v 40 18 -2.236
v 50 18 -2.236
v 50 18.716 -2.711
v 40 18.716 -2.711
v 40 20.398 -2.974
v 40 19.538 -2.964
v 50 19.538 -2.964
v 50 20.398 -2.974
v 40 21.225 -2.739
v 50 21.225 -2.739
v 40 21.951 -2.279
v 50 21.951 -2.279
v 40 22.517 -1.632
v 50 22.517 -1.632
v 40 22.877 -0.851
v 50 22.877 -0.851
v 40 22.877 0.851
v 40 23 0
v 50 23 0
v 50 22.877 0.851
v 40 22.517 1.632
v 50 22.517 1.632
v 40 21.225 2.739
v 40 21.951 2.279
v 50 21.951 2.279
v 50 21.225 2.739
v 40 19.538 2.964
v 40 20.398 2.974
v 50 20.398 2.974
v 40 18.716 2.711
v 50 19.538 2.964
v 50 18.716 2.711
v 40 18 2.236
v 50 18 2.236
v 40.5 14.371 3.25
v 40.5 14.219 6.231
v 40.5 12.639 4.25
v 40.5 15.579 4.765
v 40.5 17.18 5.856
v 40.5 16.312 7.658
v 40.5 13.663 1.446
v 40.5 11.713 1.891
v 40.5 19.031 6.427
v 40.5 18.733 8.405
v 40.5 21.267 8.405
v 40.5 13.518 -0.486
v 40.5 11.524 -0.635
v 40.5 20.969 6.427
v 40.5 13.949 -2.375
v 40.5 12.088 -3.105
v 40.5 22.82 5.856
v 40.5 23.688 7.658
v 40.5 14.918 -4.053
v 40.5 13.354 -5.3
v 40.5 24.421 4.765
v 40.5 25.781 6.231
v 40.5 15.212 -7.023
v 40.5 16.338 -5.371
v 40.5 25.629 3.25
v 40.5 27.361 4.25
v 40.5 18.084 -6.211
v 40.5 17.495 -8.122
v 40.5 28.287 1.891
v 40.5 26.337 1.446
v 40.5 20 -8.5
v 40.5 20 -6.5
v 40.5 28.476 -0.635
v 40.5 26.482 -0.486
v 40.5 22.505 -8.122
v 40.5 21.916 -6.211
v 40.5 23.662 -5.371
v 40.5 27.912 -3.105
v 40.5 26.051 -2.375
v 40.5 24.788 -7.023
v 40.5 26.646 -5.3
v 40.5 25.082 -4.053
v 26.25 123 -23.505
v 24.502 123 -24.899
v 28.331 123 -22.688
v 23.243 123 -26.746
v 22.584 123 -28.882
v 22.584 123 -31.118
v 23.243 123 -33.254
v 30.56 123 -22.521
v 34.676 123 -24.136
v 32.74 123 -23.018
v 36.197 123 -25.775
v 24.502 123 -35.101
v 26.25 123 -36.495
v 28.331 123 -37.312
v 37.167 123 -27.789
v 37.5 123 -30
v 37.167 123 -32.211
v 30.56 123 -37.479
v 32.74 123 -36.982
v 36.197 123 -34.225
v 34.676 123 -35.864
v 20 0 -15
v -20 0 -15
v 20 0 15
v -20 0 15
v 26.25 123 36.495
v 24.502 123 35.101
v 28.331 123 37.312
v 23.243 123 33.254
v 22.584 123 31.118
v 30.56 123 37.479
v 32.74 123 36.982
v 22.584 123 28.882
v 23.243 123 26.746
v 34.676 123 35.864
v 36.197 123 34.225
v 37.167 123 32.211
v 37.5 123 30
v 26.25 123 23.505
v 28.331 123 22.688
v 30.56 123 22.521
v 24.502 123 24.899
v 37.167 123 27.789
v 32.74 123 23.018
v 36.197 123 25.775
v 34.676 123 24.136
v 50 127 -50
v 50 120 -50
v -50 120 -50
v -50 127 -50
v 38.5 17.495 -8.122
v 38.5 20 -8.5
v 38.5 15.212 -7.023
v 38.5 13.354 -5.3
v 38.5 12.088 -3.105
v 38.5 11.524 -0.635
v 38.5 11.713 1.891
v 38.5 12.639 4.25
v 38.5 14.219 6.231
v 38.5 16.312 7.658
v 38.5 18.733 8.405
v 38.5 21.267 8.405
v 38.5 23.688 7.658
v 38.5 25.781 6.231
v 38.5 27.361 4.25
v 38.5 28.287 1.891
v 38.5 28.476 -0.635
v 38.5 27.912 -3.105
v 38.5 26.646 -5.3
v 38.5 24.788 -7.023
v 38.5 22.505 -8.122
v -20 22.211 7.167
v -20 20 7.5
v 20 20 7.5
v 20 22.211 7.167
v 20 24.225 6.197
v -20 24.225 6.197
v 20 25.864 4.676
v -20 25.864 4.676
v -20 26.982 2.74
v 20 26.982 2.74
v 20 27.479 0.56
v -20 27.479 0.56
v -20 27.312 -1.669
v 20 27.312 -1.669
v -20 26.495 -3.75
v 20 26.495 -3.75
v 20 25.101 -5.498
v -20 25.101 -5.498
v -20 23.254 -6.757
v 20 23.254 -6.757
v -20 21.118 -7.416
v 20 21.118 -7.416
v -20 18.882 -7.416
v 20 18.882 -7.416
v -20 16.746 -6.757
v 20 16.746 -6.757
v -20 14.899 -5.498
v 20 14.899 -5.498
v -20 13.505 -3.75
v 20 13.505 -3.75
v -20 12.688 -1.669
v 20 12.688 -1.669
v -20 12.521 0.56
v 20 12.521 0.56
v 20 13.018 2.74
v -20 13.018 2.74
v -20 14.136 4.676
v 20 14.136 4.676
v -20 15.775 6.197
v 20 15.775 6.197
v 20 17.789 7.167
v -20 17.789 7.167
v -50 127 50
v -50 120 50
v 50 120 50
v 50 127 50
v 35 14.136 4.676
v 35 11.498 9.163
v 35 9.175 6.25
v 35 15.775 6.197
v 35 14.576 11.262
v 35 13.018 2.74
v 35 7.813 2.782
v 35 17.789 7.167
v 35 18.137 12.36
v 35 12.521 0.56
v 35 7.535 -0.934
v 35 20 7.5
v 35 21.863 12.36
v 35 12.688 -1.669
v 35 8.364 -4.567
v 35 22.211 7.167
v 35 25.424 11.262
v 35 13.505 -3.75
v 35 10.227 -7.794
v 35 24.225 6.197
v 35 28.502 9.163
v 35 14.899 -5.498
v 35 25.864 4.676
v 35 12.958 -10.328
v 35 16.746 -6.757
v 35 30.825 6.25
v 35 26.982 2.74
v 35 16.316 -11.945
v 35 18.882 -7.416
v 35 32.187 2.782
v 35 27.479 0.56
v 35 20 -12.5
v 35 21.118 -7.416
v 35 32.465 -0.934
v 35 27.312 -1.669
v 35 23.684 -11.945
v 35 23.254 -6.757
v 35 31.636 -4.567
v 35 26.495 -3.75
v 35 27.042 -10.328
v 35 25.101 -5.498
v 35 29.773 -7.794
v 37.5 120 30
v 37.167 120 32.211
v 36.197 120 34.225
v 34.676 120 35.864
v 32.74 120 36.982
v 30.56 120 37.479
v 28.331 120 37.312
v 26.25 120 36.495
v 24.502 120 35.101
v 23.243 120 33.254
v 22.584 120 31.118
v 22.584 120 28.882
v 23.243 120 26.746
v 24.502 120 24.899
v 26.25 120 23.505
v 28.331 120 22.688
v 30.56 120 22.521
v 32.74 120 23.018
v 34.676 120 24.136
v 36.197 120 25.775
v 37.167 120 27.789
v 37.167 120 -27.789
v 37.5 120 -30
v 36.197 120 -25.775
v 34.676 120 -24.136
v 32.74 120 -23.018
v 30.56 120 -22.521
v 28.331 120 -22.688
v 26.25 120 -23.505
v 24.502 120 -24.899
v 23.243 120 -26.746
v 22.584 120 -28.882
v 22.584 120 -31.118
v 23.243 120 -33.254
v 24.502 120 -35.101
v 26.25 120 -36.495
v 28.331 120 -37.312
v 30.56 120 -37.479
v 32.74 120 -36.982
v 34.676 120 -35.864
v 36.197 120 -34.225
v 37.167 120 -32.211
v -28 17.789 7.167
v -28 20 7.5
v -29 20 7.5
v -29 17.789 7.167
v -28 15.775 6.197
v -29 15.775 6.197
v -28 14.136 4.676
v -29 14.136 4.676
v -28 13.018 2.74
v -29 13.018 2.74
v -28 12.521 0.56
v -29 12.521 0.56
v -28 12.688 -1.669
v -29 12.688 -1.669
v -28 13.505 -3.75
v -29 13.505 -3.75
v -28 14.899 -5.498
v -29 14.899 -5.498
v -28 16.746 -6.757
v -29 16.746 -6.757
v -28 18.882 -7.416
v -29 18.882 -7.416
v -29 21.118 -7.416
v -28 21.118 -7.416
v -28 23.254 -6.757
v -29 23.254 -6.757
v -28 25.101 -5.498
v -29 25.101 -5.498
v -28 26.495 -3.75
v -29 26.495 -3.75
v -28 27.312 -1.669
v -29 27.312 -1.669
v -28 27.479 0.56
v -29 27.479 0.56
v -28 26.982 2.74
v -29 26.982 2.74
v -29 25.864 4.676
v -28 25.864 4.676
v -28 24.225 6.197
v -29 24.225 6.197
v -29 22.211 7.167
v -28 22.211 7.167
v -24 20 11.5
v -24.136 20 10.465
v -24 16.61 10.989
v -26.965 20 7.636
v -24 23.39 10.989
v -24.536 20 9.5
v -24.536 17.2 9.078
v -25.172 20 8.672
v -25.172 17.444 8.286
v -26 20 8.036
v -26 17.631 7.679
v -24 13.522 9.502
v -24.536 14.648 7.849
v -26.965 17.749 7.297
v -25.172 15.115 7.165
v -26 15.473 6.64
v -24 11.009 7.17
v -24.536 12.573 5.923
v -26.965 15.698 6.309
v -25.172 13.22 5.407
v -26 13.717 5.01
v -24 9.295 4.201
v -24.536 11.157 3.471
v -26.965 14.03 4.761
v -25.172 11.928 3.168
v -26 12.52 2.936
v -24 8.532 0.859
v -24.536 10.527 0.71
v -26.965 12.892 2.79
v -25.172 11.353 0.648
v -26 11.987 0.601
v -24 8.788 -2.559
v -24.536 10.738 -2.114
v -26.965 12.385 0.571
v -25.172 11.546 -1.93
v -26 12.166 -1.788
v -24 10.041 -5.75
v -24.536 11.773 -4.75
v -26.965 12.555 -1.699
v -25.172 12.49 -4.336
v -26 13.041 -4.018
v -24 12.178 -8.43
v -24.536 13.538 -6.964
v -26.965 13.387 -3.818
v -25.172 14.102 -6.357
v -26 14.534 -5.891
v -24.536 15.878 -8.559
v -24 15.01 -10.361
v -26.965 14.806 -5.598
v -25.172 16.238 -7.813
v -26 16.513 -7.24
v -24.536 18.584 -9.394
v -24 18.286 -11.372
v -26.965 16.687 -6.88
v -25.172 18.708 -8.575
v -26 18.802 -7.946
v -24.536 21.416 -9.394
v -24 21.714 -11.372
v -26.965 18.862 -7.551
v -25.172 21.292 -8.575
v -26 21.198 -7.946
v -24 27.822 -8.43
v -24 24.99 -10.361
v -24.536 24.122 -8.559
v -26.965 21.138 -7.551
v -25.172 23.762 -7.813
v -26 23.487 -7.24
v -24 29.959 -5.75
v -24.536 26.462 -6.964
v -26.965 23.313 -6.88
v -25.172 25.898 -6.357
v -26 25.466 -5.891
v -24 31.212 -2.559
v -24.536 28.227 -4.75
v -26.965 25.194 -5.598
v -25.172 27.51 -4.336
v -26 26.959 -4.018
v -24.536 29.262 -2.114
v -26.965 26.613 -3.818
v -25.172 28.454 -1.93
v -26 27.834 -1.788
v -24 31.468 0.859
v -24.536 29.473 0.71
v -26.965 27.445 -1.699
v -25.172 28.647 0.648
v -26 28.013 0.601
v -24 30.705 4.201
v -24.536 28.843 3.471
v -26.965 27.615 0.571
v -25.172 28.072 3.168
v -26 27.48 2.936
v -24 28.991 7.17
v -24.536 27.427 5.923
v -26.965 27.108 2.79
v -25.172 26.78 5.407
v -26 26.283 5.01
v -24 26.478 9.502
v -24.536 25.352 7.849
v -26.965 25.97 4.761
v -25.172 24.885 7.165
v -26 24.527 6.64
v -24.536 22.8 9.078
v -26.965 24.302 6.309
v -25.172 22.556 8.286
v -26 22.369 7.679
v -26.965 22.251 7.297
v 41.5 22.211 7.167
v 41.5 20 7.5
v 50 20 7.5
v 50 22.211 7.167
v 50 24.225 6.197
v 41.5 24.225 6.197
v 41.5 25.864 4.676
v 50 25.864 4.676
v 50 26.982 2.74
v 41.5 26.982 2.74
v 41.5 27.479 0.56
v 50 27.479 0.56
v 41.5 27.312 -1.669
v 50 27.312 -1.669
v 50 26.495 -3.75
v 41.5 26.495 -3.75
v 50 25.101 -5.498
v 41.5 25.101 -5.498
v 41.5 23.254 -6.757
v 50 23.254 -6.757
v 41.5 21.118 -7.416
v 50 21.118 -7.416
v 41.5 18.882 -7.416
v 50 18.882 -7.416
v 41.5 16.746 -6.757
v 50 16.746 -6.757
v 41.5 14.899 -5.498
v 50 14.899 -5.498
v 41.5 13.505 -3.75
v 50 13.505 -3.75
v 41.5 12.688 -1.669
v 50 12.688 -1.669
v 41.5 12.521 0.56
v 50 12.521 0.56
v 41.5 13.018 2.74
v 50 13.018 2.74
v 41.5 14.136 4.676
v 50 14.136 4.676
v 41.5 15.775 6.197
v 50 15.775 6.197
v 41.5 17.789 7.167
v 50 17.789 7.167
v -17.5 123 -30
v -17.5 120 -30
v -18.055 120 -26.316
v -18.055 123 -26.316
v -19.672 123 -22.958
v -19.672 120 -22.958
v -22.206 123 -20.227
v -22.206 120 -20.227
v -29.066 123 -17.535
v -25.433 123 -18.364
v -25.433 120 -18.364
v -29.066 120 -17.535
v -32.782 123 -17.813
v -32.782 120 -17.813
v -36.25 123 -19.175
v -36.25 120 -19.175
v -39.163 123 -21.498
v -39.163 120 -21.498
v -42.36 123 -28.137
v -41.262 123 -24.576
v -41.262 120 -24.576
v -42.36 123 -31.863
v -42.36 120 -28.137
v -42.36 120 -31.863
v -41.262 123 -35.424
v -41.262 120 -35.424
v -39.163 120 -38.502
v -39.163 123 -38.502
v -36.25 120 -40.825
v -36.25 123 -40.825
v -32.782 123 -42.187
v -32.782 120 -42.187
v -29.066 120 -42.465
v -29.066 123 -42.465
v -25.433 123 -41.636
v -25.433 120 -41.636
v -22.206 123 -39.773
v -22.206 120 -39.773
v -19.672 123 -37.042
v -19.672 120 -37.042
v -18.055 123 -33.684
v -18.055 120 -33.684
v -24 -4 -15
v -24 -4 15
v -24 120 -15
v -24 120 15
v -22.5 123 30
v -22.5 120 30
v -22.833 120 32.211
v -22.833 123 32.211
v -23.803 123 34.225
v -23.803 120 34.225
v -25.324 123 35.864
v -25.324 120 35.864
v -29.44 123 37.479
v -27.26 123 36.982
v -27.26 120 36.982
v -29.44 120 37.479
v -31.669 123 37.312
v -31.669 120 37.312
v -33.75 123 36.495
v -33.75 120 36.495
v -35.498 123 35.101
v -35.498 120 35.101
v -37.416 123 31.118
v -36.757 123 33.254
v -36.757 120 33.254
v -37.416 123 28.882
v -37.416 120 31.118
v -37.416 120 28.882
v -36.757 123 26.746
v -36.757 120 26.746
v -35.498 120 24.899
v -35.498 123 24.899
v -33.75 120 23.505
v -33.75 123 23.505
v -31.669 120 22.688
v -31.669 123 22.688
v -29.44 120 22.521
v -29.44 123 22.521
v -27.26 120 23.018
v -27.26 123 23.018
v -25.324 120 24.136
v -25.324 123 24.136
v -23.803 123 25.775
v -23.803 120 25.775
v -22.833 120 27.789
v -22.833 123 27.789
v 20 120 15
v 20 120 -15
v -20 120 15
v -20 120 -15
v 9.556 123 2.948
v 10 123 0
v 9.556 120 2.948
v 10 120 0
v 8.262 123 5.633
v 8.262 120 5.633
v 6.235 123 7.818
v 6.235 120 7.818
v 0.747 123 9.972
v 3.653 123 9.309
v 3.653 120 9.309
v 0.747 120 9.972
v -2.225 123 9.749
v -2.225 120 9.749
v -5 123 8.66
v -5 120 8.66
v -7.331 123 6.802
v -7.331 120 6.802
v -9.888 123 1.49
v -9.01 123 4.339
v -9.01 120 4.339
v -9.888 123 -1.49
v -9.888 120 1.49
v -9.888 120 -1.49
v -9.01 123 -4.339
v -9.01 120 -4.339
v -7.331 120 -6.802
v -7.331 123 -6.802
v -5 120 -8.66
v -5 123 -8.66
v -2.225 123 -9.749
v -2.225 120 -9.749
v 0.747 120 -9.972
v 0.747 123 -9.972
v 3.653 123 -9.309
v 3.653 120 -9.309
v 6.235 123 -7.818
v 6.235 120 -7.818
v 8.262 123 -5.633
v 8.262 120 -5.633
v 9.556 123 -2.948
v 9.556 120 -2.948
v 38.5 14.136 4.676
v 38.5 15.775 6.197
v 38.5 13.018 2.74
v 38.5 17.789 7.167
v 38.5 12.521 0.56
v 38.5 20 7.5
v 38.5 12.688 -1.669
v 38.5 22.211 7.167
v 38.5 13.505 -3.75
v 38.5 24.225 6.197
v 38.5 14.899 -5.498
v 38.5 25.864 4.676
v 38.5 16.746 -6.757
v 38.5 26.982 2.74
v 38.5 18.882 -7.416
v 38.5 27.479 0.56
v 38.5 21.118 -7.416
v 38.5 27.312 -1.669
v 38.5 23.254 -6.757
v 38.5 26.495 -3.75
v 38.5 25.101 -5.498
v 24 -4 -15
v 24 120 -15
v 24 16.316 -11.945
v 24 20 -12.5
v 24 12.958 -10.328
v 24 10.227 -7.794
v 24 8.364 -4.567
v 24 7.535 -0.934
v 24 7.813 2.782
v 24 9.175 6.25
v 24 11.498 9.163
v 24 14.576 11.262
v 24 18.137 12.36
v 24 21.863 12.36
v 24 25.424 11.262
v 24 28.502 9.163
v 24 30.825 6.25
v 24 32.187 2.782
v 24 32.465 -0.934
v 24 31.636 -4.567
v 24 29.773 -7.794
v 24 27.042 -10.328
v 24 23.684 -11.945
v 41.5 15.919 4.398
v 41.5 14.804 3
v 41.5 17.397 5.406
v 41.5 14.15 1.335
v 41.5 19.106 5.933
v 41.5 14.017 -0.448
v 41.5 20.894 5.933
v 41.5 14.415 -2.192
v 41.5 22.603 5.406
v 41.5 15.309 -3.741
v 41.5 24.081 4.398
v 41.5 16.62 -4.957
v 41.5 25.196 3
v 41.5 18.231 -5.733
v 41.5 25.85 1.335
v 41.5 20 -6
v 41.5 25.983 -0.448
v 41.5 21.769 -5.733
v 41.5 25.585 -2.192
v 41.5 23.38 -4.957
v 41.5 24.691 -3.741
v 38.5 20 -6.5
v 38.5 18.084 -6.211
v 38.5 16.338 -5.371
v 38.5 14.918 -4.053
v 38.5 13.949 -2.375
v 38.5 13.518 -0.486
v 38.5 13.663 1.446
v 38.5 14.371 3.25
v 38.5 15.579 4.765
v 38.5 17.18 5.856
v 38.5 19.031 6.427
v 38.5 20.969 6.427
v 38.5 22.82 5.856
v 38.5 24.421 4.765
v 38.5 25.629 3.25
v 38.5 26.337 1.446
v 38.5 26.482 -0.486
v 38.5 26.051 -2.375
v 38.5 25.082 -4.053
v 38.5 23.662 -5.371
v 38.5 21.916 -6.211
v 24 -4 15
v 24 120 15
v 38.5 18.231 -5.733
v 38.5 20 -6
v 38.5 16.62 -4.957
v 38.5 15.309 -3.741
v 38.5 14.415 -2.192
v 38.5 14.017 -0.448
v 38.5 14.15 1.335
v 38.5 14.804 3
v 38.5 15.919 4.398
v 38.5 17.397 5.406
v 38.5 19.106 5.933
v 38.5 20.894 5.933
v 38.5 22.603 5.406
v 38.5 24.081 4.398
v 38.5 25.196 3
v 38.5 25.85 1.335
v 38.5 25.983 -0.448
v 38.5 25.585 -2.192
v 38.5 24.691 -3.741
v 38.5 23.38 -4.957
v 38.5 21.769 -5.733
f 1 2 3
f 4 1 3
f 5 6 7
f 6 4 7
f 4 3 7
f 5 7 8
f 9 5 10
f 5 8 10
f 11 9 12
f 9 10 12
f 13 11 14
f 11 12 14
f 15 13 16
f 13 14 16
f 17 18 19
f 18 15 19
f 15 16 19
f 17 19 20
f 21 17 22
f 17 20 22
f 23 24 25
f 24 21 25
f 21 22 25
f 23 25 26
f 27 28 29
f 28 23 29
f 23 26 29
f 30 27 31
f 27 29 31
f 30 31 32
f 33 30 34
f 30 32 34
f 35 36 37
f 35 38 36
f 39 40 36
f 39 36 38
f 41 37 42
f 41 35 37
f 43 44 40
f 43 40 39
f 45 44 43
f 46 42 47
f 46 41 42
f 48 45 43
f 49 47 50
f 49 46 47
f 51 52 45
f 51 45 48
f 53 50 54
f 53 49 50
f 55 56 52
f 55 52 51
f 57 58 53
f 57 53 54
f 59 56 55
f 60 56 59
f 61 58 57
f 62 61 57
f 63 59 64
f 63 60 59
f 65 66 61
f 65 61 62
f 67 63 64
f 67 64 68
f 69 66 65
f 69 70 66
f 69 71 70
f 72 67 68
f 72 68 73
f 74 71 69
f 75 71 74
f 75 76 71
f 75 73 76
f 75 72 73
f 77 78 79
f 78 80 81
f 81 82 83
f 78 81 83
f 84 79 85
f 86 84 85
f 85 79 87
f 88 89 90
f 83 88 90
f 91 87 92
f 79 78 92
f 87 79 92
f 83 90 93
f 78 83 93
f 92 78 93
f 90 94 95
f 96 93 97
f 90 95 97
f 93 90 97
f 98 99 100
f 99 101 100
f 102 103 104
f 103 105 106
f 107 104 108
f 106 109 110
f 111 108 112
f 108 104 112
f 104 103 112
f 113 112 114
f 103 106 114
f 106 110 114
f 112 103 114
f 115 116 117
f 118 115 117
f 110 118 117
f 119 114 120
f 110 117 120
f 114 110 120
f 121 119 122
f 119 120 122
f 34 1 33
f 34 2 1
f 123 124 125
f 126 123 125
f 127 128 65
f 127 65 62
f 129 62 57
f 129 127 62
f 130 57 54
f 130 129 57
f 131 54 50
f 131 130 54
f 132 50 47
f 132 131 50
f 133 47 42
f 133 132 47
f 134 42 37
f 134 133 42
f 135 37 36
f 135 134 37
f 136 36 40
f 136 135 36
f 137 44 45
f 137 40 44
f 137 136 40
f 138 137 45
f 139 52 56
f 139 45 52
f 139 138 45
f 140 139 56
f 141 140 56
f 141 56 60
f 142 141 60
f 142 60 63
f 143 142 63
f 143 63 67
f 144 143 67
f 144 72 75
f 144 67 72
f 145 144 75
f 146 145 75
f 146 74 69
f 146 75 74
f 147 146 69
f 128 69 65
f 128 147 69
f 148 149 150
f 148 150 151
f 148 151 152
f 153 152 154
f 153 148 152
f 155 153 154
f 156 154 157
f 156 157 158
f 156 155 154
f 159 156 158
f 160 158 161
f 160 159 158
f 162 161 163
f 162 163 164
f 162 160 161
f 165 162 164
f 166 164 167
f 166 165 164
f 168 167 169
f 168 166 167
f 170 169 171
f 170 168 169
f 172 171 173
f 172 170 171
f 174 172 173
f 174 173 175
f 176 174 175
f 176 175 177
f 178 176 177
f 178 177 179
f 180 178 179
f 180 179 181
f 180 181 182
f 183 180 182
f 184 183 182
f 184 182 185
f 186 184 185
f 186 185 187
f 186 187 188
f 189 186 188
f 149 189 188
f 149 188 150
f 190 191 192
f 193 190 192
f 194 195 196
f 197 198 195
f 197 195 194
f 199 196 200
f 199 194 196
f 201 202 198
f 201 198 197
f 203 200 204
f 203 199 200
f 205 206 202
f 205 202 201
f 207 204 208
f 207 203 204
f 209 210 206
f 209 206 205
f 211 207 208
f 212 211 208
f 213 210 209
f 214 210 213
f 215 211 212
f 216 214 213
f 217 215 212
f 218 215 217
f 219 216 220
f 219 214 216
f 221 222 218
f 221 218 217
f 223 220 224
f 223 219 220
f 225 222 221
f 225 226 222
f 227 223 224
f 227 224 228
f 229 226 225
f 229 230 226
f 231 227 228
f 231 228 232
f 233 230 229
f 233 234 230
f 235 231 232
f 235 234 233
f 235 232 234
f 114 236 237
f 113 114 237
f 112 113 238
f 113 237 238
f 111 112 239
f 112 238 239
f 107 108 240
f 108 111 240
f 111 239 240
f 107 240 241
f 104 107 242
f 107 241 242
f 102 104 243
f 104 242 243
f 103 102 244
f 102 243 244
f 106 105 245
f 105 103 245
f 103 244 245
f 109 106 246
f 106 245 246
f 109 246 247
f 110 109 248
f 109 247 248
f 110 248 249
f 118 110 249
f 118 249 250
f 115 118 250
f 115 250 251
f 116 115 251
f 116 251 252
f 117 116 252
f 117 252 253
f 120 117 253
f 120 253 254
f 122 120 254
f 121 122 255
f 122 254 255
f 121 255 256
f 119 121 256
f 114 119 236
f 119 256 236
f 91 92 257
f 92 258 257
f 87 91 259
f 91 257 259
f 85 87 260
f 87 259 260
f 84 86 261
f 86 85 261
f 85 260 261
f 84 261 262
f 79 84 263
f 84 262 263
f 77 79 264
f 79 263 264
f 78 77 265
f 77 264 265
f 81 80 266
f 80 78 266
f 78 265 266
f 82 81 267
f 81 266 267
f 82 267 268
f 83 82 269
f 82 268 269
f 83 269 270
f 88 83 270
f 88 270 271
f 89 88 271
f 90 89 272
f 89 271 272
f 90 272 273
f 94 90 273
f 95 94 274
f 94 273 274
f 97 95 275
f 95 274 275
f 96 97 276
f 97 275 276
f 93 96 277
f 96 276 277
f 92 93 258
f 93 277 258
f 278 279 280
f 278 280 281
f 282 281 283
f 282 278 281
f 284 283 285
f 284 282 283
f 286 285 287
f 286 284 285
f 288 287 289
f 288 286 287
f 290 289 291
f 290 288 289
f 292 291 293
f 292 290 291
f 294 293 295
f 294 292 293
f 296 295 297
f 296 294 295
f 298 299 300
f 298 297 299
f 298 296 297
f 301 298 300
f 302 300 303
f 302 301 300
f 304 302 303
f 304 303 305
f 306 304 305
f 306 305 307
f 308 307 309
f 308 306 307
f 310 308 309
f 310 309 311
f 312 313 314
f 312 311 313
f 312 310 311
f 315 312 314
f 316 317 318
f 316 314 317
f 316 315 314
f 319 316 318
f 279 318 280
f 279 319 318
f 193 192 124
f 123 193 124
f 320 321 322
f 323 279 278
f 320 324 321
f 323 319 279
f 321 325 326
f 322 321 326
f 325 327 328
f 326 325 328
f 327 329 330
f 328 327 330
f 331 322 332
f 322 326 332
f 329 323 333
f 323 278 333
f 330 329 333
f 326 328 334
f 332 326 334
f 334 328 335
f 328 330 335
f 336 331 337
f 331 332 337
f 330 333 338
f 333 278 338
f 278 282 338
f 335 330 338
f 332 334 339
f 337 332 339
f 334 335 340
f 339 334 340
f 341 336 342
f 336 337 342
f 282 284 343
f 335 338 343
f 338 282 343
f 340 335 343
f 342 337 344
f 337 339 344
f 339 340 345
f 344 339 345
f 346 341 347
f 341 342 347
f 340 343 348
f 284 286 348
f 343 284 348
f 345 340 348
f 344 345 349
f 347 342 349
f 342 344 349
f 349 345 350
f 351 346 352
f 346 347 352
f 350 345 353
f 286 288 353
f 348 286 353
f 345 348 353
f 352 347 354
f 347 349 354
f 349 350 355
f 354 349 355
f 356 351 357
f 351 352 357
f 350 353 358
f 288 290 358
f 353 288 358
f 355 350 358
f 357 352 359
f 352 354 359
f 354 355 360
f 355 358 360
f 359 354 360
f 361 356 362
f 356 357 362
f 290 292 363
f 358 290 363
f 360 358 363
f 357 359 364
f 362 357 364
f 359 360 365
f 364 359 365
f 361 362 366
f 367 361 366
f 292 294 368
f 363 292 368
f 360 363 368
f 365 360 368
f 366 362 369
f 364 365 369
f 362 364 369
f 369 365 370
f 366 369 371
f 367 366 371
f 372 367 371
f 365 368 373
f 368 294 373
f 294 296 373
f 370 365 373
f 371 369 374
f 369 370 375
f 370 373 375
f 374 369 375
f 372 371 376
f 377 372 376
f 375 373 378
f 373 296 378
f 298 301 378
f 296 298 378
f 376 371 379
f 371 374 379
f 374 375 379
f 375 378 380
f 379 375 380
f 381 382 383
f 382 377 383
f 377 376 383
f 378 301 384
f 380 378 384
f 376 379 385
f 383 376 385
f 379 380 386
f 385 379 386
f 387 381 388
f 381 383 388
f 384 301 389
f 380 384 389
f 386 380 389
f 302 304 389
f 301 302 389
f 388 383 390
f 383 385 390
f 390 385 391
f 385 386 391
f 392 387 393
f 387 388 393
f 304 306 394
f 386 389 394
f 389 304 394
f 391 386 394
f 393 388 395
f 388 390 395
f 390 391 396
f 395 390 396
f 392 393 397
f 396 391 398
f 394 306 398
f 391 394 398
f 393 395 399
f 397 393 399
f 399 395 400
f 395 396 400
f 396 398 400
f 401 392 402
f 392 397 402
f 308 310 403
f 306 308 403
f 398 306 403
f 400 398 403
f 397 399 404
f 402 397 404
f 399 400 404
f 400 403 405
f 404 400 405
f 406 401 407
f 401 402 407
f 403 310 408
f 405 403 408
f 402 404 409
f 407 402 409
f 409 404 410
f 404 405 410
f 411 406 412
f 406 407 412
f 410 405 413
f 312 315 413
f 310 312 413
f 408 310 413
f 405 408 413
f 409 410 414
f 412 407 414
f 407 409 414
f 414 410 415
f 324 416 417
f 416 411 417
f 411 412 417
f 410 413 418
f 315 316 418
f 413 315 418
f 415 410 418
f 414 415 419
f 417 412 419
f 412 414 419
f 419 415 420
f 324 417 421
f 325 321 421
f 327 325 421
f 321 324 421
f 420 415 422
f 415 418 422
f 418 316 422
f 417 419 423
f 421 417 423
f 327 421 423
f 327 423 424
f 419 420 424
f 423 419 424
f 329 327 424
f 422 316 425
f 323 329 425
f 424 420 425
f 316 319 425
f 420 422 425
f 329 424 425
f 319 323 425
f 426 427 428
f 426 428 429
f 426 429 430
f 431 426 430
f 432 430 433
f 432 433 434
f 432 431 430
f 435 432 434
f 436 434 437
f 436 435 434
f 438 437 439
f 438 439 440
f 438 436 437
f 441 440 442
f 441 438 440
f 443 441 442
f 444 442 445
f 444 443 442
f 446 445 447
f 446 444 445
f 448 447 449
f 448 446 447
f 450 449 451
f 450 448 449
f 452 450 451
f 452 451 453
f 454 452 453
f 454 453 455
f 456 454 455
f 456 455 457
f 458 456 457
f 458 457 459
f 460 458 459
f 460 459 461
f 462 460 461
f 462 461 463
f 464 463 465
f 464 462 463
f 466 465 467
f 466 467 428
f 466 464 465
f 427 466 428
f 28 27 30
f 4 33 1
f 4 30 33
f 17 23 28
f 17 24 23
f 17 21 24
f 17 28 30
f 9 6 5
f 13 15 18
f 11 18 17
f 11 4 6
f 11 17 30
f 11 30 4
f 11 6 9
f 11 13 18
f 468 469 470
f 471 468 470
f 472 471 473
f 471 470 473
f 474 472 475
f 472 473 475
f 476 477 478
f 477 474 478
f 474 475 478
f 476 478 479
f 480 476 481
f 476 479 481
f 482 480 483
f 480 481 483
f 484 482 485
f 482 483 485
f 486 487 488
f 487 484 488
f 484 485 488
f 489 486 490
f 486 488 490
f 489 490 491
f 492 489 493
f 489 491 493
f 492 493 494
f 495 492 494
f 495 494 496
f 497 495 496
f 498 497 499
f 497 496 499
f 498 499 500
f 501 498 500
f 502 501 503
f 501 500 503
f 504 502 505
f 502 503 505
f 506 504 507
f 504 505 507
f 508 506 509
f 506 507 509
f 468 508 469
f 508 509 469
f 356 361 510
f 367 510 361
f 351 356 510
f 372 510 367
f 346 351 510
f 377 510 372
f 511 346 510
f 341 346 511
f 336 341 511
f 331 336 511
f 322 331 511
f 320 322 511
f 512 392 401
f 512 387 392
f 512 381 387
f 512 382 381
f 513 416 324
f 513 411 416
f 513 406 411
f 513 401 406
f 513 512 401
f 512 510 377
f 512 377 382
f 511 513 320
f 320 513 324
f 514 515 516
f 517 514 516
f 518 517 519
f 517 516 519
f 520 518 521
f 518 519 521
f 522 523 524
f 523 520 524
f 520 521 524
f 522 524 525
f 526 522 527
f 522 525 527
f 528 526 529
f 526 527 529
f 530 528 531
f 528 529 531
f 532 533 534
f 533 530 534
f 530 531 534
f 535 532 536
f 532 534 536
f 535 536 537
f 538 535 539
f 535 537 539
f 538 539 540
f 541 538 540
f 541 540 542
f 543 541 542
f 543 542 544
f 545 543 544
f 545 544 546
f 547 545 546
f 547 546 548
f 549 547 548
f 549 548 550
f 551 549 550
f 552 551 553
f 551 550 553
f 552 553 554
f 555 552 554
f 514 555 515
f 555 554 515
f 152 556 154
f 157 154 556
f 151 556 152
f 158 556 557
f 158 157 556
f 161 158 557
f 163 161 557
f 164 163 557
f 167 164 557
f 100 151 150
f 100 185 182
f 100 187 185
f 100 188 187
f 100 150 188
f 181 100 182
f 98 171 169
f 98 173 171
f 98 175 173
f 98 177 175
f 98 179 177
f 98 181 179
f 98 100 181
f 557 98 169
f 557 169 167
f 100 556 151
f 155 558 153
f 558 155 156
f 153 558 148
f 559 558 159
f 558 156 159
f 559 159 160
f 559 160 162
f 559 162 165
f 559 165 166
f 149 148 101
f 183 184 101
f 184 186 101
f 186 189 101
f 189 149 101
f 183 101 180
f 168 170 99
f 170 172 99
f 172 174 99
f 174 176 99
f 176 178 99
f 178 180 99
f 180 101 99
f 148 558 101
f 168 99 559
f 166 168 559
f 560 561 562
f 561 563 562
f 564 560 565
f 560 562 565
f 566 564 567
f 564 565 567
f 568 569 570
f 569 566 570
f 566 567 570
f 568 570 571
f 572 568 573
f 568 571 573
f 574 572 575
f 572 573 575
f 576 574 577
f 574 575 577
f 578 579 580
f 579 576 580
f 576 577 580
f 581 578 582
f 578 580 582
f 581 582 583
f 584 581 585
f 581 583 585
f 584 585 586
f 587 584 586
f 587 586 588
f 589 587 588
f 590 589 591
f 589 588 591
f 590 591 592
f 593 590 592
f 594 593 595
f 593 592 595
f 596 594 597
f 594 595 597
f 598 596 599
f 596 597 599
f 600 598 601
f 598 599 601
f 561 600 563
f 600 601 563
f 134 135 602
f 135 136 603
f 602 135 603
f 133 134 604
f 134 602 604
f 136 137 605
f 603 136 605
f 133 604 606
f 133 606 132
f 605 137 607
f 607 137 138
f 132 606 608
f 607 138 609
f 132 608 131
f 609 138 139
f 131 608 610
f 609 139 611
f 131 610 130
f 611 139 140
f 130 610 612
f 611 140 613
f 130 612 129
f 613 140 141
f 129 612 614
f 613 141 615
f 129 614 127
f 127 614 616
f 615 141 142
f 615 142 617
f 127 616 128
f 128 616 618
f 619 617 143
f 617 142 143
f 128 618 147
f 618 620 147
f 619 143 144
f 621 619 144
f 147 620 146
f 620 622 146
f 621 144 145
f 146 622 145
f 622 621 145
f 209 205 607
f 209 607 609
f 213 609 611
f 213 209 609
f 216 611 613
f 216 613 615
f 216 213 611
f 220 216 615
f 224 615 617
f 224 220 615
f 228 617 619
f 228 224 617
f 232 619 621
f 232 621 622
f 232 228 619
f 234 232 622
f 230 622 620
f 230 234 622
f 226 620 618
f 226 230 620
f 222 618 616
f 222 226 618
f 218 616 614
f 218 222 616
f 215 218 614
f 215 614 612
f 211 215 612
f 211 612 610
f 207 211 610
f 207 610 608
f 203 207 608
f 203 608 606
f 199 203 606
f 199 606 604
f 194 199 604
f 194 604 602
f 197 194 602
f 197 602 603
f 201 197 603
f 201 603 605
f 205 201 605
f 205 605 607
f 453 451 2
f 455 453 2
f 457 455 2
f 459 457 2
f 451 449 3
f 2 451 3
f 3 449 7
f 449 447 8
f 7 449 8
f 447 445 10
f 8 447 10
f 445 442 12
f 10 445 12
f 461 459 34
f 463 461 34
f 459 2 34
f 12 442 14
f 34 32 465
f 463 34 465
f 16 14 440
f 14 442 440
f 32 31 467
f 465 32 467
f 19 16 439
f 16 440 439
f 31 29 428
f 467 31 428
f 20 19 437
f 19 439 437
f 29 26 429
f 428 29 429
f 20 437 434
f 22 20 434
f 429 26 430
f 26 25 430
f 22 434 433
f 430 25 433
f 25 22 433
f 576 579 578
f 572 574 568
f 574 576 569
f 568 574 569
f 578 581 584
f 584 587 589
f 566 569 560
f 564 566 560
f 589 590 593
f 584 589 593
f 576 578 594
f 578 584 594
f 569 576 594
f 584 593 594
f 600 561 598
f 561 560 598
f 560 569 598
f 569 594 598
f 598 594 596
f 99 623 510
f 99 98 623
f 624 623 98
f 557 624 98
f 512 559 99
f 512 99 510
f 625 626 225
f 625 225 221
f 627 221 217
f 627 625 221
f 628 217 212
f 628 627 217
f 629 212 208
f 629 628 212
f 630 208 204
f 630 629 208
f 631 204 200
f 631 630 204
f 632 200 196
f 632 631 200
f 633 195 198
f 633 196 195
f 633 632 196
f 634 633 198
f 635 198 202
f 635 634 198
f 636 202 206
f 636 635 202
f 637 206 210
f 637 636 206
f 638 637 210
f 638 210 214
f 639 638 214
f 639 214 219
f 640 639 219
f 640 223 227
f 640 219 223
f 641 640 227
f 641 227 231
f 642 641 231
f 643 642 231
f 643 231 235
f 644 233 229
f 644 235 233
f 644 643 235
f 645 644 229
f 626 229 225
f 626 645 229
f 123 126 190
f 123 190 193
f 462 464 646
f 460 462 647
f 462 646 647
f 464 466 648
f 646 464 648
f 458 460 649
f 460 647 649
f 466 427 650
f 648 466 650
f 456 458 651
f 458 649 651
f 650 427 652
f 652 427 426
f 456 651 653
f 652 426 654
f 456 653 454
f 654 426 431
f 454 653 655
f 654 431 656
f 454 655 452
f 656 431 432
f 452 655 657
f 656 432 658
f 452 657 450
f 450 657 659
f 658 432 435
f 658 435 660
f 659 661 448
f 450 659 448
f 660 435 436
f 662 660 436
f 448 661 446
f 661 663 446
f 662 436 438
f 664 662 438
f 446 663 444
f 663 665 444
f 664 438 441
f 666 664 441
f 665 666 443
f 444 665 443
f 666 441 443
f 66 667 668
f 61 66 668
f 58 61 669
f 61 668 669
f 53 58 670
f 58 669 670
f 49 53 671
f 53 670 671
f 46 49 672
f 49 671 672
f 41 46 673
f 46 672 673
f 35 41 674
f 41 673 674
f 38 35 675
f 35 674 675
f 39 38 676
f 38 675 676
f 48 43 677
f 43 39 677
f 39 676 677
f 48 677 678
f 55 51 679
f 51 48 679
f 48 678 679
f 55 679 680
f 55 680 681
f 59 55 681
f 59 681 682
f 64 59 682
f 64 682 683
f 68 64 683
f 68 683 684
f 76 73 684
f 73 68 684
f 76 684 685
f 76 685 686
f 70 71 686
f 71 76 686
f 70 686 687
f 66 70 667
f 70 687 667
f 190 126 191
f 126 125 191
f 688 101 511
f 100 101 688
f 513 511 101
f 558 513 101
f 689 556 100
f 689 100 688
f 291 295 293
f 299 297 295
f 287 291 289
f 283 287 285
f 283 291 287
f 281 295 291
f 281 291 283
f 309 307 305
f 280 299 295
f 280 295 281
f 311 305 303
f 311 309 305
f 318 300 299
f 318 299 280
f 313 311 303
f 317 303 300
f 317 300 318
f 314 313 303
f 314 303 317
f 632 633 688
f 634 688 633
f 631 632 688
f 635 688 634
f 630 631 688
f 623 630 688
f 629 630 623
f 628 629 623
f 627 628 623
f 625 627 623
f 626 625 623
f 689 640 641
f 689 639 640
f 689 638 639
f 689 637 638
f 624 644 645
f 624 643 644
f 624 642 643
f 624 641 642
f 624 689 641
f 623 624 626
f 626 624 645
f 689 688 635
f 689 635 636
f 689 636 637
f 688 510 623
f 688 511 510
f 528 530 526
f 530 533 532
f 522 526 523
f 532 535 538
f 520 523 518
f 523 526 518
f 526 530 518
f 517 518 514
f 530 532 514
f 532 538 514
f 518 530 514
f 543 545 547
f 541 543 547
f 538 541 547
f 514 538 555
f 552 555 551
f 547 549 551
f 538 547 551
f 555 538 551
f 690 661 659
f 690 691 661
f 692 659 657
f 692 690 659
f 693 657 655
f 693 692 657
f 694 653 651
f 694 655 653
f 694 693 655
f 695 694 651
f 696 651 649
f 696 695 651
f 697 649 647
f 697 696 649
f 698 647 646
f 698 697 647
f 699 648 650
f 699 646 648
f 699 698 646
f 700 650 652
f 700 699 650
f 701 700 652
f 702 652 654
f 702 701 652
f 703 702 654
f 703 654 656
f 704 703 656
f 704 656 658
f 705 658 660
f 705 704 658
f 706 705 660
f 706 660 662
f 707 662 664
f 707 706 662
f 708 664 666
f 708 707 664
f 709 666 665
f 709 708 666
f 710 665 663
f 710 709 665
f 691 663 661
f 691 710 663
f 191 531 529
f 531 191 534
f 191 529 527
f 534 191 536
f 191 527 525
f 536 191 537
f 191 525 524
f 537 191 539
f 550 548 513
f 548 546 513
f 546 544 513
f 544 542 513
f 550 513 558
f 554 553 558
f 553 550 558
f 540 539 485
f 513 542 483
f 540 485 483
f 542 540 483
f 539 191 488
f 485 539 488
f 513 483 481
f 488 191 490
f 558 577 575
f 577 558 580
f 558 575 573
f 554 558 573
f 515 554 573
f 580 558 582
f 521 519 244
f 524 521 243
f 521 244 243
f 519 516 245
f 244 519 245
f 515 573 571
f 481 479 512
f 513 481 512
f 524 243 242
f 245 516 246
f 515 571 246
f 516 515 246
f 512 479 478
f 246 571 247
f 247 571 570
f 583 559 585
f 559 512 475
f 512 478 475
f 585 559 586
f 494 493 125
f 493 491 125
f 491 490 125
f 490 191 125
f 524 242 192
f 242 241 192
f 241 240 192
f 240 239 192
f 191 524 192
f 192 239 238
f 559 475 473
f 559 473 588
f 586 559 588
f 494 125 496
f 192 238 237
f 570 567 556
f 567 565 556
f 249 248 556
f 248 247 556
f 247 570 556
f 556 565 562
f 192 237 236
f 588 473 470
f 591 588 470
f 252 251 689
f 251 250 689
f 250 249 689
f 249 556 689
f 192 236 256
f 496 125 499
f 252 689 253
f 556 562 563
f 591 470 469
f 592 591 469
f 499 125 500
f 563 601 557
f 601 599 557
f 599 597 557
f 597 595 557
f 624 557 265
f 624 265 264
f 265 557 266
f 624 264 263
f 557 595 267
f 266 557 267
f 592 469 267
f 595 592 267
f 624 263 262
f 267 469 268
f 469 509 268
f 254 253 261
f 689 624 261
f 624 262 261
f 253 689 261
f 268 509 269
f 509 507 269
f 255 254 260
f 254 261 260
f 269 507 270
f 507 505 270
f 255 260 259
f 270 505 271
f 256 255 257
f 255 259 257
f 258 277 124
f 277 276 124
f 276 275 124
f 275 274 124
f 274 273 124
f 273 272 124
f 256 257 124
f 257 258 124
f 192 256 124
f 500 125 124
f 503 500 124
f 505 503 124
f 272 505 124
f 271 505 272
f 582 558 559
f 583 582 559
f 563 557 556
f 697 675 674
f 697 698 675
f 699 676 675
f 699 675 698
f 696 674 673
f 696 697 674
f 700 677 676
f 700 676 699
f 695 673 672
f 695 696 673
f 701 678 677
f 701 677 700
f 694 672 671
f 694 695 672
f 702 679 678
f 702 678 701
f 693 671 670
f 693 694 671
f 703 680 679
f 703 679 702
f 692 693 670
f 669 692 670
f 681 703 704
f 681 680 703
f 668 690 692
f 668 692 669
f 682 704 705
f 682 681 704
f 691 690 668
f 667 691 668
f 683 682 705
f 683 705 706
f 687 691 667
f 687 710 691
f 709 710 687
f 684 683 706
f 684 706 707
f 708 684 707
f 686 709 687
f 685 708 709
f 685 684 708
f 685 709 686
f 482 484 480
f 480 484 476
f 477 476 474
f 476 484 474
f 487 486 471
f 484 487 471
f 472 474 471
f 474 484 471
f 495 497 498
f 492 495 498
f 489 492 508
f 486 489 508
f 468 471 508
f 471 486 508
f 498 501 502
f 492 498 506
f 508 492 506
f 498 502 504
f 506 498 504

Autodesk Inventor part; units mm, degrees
ref_plane "YZ Plane" through (0, 0, 0) normal (1, 0, 0) x (0, 1, 0)
ref_plane "XZ Plane" through (0, 0, 0) normal (0, 1, 0) x (-1, 0, 0)
sketch "Sketch1" plane through (0, 0, 0) normal (0, 1, 0) x (-1, 0, 0)
  line L0 (0, 0) -> (20, 0)
  line L1 (24, 15) -> (20, 15)
  line L2 (20, 15) -> (20, -15)
  line L3 (20, -15) -> (24, -15)
  line L4 (24, -15) -> (24, 15)
  line L5 (0, 0) -> (0, -10) construction
  line L6 (-24, 15) -> (-20, 15)
  line L7 (-20, 15) -> (-20, -15)
  line L8 (-20, -15) -> (-24, -15)
  line L9 (-24, -15) -> (-24, 15)
  point P0 (-20, 0)
  dimension "d0" = 20
  dimension "d1" = 30
  dimension "d2" = 4
  dimension "d3" = 15
extrude "Extrusion1" add sketch "Sketch1" along normal blind 120
sketch "Sketch2" plane through (-24, 0, -15) normal (-1, 0, 0) x (0, 0, 1)
  circle A0 centre (15, 20) radius 7.5
  line L0 (0, 0) -> (30, 0) projected
  point P0 (15, 0)
  dimension "d6" = 20
  dimension "d7" = 15
extrude "Extrusion2" cut sketch "Sketch2" against normal up to surface (48 mm away)
sketch "Sketch3" plane through (0, 0, 0) normal (0, -1, 0) x (1, 0, 0)
  line L0 (24, 15) -> (24, -15) projected
  line L1 (-24, -15) -> (-24, 15) projected
  line L2 (24, -15) -> (-24, -15)
  line L3 (20, 15) -> (24, 15) projected
  line L4 (-24, 15) -> (24, 15)
  point P0 (0, 0)
extrude "Extrusion3" add sketch "Sketch3" along normal blind 4
sketch "Sketch4" plane through (24, 120, 15) normal (1, 0, 0) x (0, 0, -1)
  circle A0 centre (15, -100) radius 7.5 projected
  circle A1 centre (15, -100) radius 12.5
  point P0 (15, -120)
  dimension "d12" = 25
extrude "Extrusion4" cut sketch "Sketch4" against normal blind 1
sketch "Sketch6" plane through (0, 120, 0) normal (0, 1, 0) x (1, 0, 0)
  line L0 (-50, -50) -> (50, -50)
  line L1 (50, -50) -> (50, 50)
  line L2 (50, 50) -> (-50, 50)
  line L3 (-50, 50) -> (-50, -50)
  line L4 (-50, -50) -> (50, 50) construction
  line L5 (50, -50) -> (-50, 50) construction
  circle A0 centre (-30, 30) radius 12.5
  circle A1 centre (-30, -30) radius 7.5
  circle A2 centre (30, 30) radius 7.5
  circle A3 centre (30, -30) radius 7.5
  circle A4 centre (0, 0) radius 10
  dimension "d15" = 100
  dimension "d16" = 100
  dimension "d17" = 30
  dimension "d18" = 25
  dimension "d20" = 15
  dimension "d21" = 20
extrude "Extrusion5" add sketch "Sketch6" along normal blind 3
sketch "Sketch7" plane through (0, 123, 0) normal (0, 1, 0) x (1, 0, 0)
  line L0 (50, 50) -> (-50, 50) projected
  line L1 (-50, 50) -> (-50, -50) projected
  line L2 (-50, -50) -> (50, -50) projected
  line L3 (50, -50) -> (50, 50) projected
  circle A0 centre (-30, 30) radius 12.5 projected
  circle A1 centre (-30, -30) radius 7.5 projected
  circle A2 centre (30, 30) radius 7.5 projected
  circle A3 centre (30, -30) radius 7.5 projected
  circle A4 centre (0, 0) radius 10 projected
extrude "Extrusion6" add sketch "Sketch7" along normal blind 4 contours L3 L2 L1 L0 | A0 | A1 | A2 | A3 | A4
sketch "Sketch8" plane through (24, -4, 15) normal (1, 0, 0) x (0, 0, -1)
  circle A0 centre (15, 24) radius 12.5 projected
  circle A1 centre (15, 24) radius 7.5 projected
  point P0 (15, 4)
extrude "Extrusion7" add sketch "Sketch8" along normal blind 11 and the other way blind 1
sketch "Sketch9" plane through (-24, -4, -15) normal (-1, 0, 0) x (0, 0, 1)
  circle A0 centre (15, 24) radius 7.5 projected
  point P0 (15, 4)
extrude "Extrusion8" add sketch "Sketch9" along normal blind 5 and the other way blind 74
sketch "Sketch10" plane through (50, 20, 0) normal (1, 0, 0) x (0, 0, -1)
  circle A0 centre (0, 0) radius 7.5 projected
  circle A1 centre (0, 0) radius 3
  line L0 (2.2361, -2) -> (-2.2361, -2)
  point P0 (0, -20)
  dimension "d34" = 6
  dimension "d35" = 2
extrude "Extrusion9" cut sketch "Sketch10" against normal blind 10 contours A1 L0 picked at (0.8351, -0.0457)
ref_plane "Work Plane1" through (38.5, 20, 0) normal (1, 0, 0) x (0, 0, -1)
sketch "Sketch11" plane through (38.5, 20, 0) normal (1, 0, 0) x (0, 0, -1)
  circle A0 centre (0, 0) radius 7.5 projected
  circle A1 centre (0, 0) radius 6
  point P0 (0, -20)
  dimension "d39" = 12
extrude "Extrusion10" cut sketch "Sketch11" along normal blind 3
sketch "Sketch12" plane through (38.5, 20, 0) normal (1, 0, 0) x (0, 0, -1)
  circle A0 centre (0, 0) radius 7.5 projected
  circle A1 centre (0, 0) radius 7.5 projected
  circle A2 centre (0, 0) radius 7.5 projected
  circle A3 centre (0, 0) radius 6.5
  circle A4 centre (0, 0) radius 8.5
  point P0 (0, -20)
  dimension "d42" = 13
  dimension "d43" = 17
extrude "Extrusion11" add sketch "Sketch12" along normal blind 2 contours A0 | A4
fillet "Fillet1" radius 4 1 edges at (-24, 20, -7.5)
equation "\"d3\" = 0.5 * d1"
properties part number "manufacturing link-4" material "Steel, Mild"
